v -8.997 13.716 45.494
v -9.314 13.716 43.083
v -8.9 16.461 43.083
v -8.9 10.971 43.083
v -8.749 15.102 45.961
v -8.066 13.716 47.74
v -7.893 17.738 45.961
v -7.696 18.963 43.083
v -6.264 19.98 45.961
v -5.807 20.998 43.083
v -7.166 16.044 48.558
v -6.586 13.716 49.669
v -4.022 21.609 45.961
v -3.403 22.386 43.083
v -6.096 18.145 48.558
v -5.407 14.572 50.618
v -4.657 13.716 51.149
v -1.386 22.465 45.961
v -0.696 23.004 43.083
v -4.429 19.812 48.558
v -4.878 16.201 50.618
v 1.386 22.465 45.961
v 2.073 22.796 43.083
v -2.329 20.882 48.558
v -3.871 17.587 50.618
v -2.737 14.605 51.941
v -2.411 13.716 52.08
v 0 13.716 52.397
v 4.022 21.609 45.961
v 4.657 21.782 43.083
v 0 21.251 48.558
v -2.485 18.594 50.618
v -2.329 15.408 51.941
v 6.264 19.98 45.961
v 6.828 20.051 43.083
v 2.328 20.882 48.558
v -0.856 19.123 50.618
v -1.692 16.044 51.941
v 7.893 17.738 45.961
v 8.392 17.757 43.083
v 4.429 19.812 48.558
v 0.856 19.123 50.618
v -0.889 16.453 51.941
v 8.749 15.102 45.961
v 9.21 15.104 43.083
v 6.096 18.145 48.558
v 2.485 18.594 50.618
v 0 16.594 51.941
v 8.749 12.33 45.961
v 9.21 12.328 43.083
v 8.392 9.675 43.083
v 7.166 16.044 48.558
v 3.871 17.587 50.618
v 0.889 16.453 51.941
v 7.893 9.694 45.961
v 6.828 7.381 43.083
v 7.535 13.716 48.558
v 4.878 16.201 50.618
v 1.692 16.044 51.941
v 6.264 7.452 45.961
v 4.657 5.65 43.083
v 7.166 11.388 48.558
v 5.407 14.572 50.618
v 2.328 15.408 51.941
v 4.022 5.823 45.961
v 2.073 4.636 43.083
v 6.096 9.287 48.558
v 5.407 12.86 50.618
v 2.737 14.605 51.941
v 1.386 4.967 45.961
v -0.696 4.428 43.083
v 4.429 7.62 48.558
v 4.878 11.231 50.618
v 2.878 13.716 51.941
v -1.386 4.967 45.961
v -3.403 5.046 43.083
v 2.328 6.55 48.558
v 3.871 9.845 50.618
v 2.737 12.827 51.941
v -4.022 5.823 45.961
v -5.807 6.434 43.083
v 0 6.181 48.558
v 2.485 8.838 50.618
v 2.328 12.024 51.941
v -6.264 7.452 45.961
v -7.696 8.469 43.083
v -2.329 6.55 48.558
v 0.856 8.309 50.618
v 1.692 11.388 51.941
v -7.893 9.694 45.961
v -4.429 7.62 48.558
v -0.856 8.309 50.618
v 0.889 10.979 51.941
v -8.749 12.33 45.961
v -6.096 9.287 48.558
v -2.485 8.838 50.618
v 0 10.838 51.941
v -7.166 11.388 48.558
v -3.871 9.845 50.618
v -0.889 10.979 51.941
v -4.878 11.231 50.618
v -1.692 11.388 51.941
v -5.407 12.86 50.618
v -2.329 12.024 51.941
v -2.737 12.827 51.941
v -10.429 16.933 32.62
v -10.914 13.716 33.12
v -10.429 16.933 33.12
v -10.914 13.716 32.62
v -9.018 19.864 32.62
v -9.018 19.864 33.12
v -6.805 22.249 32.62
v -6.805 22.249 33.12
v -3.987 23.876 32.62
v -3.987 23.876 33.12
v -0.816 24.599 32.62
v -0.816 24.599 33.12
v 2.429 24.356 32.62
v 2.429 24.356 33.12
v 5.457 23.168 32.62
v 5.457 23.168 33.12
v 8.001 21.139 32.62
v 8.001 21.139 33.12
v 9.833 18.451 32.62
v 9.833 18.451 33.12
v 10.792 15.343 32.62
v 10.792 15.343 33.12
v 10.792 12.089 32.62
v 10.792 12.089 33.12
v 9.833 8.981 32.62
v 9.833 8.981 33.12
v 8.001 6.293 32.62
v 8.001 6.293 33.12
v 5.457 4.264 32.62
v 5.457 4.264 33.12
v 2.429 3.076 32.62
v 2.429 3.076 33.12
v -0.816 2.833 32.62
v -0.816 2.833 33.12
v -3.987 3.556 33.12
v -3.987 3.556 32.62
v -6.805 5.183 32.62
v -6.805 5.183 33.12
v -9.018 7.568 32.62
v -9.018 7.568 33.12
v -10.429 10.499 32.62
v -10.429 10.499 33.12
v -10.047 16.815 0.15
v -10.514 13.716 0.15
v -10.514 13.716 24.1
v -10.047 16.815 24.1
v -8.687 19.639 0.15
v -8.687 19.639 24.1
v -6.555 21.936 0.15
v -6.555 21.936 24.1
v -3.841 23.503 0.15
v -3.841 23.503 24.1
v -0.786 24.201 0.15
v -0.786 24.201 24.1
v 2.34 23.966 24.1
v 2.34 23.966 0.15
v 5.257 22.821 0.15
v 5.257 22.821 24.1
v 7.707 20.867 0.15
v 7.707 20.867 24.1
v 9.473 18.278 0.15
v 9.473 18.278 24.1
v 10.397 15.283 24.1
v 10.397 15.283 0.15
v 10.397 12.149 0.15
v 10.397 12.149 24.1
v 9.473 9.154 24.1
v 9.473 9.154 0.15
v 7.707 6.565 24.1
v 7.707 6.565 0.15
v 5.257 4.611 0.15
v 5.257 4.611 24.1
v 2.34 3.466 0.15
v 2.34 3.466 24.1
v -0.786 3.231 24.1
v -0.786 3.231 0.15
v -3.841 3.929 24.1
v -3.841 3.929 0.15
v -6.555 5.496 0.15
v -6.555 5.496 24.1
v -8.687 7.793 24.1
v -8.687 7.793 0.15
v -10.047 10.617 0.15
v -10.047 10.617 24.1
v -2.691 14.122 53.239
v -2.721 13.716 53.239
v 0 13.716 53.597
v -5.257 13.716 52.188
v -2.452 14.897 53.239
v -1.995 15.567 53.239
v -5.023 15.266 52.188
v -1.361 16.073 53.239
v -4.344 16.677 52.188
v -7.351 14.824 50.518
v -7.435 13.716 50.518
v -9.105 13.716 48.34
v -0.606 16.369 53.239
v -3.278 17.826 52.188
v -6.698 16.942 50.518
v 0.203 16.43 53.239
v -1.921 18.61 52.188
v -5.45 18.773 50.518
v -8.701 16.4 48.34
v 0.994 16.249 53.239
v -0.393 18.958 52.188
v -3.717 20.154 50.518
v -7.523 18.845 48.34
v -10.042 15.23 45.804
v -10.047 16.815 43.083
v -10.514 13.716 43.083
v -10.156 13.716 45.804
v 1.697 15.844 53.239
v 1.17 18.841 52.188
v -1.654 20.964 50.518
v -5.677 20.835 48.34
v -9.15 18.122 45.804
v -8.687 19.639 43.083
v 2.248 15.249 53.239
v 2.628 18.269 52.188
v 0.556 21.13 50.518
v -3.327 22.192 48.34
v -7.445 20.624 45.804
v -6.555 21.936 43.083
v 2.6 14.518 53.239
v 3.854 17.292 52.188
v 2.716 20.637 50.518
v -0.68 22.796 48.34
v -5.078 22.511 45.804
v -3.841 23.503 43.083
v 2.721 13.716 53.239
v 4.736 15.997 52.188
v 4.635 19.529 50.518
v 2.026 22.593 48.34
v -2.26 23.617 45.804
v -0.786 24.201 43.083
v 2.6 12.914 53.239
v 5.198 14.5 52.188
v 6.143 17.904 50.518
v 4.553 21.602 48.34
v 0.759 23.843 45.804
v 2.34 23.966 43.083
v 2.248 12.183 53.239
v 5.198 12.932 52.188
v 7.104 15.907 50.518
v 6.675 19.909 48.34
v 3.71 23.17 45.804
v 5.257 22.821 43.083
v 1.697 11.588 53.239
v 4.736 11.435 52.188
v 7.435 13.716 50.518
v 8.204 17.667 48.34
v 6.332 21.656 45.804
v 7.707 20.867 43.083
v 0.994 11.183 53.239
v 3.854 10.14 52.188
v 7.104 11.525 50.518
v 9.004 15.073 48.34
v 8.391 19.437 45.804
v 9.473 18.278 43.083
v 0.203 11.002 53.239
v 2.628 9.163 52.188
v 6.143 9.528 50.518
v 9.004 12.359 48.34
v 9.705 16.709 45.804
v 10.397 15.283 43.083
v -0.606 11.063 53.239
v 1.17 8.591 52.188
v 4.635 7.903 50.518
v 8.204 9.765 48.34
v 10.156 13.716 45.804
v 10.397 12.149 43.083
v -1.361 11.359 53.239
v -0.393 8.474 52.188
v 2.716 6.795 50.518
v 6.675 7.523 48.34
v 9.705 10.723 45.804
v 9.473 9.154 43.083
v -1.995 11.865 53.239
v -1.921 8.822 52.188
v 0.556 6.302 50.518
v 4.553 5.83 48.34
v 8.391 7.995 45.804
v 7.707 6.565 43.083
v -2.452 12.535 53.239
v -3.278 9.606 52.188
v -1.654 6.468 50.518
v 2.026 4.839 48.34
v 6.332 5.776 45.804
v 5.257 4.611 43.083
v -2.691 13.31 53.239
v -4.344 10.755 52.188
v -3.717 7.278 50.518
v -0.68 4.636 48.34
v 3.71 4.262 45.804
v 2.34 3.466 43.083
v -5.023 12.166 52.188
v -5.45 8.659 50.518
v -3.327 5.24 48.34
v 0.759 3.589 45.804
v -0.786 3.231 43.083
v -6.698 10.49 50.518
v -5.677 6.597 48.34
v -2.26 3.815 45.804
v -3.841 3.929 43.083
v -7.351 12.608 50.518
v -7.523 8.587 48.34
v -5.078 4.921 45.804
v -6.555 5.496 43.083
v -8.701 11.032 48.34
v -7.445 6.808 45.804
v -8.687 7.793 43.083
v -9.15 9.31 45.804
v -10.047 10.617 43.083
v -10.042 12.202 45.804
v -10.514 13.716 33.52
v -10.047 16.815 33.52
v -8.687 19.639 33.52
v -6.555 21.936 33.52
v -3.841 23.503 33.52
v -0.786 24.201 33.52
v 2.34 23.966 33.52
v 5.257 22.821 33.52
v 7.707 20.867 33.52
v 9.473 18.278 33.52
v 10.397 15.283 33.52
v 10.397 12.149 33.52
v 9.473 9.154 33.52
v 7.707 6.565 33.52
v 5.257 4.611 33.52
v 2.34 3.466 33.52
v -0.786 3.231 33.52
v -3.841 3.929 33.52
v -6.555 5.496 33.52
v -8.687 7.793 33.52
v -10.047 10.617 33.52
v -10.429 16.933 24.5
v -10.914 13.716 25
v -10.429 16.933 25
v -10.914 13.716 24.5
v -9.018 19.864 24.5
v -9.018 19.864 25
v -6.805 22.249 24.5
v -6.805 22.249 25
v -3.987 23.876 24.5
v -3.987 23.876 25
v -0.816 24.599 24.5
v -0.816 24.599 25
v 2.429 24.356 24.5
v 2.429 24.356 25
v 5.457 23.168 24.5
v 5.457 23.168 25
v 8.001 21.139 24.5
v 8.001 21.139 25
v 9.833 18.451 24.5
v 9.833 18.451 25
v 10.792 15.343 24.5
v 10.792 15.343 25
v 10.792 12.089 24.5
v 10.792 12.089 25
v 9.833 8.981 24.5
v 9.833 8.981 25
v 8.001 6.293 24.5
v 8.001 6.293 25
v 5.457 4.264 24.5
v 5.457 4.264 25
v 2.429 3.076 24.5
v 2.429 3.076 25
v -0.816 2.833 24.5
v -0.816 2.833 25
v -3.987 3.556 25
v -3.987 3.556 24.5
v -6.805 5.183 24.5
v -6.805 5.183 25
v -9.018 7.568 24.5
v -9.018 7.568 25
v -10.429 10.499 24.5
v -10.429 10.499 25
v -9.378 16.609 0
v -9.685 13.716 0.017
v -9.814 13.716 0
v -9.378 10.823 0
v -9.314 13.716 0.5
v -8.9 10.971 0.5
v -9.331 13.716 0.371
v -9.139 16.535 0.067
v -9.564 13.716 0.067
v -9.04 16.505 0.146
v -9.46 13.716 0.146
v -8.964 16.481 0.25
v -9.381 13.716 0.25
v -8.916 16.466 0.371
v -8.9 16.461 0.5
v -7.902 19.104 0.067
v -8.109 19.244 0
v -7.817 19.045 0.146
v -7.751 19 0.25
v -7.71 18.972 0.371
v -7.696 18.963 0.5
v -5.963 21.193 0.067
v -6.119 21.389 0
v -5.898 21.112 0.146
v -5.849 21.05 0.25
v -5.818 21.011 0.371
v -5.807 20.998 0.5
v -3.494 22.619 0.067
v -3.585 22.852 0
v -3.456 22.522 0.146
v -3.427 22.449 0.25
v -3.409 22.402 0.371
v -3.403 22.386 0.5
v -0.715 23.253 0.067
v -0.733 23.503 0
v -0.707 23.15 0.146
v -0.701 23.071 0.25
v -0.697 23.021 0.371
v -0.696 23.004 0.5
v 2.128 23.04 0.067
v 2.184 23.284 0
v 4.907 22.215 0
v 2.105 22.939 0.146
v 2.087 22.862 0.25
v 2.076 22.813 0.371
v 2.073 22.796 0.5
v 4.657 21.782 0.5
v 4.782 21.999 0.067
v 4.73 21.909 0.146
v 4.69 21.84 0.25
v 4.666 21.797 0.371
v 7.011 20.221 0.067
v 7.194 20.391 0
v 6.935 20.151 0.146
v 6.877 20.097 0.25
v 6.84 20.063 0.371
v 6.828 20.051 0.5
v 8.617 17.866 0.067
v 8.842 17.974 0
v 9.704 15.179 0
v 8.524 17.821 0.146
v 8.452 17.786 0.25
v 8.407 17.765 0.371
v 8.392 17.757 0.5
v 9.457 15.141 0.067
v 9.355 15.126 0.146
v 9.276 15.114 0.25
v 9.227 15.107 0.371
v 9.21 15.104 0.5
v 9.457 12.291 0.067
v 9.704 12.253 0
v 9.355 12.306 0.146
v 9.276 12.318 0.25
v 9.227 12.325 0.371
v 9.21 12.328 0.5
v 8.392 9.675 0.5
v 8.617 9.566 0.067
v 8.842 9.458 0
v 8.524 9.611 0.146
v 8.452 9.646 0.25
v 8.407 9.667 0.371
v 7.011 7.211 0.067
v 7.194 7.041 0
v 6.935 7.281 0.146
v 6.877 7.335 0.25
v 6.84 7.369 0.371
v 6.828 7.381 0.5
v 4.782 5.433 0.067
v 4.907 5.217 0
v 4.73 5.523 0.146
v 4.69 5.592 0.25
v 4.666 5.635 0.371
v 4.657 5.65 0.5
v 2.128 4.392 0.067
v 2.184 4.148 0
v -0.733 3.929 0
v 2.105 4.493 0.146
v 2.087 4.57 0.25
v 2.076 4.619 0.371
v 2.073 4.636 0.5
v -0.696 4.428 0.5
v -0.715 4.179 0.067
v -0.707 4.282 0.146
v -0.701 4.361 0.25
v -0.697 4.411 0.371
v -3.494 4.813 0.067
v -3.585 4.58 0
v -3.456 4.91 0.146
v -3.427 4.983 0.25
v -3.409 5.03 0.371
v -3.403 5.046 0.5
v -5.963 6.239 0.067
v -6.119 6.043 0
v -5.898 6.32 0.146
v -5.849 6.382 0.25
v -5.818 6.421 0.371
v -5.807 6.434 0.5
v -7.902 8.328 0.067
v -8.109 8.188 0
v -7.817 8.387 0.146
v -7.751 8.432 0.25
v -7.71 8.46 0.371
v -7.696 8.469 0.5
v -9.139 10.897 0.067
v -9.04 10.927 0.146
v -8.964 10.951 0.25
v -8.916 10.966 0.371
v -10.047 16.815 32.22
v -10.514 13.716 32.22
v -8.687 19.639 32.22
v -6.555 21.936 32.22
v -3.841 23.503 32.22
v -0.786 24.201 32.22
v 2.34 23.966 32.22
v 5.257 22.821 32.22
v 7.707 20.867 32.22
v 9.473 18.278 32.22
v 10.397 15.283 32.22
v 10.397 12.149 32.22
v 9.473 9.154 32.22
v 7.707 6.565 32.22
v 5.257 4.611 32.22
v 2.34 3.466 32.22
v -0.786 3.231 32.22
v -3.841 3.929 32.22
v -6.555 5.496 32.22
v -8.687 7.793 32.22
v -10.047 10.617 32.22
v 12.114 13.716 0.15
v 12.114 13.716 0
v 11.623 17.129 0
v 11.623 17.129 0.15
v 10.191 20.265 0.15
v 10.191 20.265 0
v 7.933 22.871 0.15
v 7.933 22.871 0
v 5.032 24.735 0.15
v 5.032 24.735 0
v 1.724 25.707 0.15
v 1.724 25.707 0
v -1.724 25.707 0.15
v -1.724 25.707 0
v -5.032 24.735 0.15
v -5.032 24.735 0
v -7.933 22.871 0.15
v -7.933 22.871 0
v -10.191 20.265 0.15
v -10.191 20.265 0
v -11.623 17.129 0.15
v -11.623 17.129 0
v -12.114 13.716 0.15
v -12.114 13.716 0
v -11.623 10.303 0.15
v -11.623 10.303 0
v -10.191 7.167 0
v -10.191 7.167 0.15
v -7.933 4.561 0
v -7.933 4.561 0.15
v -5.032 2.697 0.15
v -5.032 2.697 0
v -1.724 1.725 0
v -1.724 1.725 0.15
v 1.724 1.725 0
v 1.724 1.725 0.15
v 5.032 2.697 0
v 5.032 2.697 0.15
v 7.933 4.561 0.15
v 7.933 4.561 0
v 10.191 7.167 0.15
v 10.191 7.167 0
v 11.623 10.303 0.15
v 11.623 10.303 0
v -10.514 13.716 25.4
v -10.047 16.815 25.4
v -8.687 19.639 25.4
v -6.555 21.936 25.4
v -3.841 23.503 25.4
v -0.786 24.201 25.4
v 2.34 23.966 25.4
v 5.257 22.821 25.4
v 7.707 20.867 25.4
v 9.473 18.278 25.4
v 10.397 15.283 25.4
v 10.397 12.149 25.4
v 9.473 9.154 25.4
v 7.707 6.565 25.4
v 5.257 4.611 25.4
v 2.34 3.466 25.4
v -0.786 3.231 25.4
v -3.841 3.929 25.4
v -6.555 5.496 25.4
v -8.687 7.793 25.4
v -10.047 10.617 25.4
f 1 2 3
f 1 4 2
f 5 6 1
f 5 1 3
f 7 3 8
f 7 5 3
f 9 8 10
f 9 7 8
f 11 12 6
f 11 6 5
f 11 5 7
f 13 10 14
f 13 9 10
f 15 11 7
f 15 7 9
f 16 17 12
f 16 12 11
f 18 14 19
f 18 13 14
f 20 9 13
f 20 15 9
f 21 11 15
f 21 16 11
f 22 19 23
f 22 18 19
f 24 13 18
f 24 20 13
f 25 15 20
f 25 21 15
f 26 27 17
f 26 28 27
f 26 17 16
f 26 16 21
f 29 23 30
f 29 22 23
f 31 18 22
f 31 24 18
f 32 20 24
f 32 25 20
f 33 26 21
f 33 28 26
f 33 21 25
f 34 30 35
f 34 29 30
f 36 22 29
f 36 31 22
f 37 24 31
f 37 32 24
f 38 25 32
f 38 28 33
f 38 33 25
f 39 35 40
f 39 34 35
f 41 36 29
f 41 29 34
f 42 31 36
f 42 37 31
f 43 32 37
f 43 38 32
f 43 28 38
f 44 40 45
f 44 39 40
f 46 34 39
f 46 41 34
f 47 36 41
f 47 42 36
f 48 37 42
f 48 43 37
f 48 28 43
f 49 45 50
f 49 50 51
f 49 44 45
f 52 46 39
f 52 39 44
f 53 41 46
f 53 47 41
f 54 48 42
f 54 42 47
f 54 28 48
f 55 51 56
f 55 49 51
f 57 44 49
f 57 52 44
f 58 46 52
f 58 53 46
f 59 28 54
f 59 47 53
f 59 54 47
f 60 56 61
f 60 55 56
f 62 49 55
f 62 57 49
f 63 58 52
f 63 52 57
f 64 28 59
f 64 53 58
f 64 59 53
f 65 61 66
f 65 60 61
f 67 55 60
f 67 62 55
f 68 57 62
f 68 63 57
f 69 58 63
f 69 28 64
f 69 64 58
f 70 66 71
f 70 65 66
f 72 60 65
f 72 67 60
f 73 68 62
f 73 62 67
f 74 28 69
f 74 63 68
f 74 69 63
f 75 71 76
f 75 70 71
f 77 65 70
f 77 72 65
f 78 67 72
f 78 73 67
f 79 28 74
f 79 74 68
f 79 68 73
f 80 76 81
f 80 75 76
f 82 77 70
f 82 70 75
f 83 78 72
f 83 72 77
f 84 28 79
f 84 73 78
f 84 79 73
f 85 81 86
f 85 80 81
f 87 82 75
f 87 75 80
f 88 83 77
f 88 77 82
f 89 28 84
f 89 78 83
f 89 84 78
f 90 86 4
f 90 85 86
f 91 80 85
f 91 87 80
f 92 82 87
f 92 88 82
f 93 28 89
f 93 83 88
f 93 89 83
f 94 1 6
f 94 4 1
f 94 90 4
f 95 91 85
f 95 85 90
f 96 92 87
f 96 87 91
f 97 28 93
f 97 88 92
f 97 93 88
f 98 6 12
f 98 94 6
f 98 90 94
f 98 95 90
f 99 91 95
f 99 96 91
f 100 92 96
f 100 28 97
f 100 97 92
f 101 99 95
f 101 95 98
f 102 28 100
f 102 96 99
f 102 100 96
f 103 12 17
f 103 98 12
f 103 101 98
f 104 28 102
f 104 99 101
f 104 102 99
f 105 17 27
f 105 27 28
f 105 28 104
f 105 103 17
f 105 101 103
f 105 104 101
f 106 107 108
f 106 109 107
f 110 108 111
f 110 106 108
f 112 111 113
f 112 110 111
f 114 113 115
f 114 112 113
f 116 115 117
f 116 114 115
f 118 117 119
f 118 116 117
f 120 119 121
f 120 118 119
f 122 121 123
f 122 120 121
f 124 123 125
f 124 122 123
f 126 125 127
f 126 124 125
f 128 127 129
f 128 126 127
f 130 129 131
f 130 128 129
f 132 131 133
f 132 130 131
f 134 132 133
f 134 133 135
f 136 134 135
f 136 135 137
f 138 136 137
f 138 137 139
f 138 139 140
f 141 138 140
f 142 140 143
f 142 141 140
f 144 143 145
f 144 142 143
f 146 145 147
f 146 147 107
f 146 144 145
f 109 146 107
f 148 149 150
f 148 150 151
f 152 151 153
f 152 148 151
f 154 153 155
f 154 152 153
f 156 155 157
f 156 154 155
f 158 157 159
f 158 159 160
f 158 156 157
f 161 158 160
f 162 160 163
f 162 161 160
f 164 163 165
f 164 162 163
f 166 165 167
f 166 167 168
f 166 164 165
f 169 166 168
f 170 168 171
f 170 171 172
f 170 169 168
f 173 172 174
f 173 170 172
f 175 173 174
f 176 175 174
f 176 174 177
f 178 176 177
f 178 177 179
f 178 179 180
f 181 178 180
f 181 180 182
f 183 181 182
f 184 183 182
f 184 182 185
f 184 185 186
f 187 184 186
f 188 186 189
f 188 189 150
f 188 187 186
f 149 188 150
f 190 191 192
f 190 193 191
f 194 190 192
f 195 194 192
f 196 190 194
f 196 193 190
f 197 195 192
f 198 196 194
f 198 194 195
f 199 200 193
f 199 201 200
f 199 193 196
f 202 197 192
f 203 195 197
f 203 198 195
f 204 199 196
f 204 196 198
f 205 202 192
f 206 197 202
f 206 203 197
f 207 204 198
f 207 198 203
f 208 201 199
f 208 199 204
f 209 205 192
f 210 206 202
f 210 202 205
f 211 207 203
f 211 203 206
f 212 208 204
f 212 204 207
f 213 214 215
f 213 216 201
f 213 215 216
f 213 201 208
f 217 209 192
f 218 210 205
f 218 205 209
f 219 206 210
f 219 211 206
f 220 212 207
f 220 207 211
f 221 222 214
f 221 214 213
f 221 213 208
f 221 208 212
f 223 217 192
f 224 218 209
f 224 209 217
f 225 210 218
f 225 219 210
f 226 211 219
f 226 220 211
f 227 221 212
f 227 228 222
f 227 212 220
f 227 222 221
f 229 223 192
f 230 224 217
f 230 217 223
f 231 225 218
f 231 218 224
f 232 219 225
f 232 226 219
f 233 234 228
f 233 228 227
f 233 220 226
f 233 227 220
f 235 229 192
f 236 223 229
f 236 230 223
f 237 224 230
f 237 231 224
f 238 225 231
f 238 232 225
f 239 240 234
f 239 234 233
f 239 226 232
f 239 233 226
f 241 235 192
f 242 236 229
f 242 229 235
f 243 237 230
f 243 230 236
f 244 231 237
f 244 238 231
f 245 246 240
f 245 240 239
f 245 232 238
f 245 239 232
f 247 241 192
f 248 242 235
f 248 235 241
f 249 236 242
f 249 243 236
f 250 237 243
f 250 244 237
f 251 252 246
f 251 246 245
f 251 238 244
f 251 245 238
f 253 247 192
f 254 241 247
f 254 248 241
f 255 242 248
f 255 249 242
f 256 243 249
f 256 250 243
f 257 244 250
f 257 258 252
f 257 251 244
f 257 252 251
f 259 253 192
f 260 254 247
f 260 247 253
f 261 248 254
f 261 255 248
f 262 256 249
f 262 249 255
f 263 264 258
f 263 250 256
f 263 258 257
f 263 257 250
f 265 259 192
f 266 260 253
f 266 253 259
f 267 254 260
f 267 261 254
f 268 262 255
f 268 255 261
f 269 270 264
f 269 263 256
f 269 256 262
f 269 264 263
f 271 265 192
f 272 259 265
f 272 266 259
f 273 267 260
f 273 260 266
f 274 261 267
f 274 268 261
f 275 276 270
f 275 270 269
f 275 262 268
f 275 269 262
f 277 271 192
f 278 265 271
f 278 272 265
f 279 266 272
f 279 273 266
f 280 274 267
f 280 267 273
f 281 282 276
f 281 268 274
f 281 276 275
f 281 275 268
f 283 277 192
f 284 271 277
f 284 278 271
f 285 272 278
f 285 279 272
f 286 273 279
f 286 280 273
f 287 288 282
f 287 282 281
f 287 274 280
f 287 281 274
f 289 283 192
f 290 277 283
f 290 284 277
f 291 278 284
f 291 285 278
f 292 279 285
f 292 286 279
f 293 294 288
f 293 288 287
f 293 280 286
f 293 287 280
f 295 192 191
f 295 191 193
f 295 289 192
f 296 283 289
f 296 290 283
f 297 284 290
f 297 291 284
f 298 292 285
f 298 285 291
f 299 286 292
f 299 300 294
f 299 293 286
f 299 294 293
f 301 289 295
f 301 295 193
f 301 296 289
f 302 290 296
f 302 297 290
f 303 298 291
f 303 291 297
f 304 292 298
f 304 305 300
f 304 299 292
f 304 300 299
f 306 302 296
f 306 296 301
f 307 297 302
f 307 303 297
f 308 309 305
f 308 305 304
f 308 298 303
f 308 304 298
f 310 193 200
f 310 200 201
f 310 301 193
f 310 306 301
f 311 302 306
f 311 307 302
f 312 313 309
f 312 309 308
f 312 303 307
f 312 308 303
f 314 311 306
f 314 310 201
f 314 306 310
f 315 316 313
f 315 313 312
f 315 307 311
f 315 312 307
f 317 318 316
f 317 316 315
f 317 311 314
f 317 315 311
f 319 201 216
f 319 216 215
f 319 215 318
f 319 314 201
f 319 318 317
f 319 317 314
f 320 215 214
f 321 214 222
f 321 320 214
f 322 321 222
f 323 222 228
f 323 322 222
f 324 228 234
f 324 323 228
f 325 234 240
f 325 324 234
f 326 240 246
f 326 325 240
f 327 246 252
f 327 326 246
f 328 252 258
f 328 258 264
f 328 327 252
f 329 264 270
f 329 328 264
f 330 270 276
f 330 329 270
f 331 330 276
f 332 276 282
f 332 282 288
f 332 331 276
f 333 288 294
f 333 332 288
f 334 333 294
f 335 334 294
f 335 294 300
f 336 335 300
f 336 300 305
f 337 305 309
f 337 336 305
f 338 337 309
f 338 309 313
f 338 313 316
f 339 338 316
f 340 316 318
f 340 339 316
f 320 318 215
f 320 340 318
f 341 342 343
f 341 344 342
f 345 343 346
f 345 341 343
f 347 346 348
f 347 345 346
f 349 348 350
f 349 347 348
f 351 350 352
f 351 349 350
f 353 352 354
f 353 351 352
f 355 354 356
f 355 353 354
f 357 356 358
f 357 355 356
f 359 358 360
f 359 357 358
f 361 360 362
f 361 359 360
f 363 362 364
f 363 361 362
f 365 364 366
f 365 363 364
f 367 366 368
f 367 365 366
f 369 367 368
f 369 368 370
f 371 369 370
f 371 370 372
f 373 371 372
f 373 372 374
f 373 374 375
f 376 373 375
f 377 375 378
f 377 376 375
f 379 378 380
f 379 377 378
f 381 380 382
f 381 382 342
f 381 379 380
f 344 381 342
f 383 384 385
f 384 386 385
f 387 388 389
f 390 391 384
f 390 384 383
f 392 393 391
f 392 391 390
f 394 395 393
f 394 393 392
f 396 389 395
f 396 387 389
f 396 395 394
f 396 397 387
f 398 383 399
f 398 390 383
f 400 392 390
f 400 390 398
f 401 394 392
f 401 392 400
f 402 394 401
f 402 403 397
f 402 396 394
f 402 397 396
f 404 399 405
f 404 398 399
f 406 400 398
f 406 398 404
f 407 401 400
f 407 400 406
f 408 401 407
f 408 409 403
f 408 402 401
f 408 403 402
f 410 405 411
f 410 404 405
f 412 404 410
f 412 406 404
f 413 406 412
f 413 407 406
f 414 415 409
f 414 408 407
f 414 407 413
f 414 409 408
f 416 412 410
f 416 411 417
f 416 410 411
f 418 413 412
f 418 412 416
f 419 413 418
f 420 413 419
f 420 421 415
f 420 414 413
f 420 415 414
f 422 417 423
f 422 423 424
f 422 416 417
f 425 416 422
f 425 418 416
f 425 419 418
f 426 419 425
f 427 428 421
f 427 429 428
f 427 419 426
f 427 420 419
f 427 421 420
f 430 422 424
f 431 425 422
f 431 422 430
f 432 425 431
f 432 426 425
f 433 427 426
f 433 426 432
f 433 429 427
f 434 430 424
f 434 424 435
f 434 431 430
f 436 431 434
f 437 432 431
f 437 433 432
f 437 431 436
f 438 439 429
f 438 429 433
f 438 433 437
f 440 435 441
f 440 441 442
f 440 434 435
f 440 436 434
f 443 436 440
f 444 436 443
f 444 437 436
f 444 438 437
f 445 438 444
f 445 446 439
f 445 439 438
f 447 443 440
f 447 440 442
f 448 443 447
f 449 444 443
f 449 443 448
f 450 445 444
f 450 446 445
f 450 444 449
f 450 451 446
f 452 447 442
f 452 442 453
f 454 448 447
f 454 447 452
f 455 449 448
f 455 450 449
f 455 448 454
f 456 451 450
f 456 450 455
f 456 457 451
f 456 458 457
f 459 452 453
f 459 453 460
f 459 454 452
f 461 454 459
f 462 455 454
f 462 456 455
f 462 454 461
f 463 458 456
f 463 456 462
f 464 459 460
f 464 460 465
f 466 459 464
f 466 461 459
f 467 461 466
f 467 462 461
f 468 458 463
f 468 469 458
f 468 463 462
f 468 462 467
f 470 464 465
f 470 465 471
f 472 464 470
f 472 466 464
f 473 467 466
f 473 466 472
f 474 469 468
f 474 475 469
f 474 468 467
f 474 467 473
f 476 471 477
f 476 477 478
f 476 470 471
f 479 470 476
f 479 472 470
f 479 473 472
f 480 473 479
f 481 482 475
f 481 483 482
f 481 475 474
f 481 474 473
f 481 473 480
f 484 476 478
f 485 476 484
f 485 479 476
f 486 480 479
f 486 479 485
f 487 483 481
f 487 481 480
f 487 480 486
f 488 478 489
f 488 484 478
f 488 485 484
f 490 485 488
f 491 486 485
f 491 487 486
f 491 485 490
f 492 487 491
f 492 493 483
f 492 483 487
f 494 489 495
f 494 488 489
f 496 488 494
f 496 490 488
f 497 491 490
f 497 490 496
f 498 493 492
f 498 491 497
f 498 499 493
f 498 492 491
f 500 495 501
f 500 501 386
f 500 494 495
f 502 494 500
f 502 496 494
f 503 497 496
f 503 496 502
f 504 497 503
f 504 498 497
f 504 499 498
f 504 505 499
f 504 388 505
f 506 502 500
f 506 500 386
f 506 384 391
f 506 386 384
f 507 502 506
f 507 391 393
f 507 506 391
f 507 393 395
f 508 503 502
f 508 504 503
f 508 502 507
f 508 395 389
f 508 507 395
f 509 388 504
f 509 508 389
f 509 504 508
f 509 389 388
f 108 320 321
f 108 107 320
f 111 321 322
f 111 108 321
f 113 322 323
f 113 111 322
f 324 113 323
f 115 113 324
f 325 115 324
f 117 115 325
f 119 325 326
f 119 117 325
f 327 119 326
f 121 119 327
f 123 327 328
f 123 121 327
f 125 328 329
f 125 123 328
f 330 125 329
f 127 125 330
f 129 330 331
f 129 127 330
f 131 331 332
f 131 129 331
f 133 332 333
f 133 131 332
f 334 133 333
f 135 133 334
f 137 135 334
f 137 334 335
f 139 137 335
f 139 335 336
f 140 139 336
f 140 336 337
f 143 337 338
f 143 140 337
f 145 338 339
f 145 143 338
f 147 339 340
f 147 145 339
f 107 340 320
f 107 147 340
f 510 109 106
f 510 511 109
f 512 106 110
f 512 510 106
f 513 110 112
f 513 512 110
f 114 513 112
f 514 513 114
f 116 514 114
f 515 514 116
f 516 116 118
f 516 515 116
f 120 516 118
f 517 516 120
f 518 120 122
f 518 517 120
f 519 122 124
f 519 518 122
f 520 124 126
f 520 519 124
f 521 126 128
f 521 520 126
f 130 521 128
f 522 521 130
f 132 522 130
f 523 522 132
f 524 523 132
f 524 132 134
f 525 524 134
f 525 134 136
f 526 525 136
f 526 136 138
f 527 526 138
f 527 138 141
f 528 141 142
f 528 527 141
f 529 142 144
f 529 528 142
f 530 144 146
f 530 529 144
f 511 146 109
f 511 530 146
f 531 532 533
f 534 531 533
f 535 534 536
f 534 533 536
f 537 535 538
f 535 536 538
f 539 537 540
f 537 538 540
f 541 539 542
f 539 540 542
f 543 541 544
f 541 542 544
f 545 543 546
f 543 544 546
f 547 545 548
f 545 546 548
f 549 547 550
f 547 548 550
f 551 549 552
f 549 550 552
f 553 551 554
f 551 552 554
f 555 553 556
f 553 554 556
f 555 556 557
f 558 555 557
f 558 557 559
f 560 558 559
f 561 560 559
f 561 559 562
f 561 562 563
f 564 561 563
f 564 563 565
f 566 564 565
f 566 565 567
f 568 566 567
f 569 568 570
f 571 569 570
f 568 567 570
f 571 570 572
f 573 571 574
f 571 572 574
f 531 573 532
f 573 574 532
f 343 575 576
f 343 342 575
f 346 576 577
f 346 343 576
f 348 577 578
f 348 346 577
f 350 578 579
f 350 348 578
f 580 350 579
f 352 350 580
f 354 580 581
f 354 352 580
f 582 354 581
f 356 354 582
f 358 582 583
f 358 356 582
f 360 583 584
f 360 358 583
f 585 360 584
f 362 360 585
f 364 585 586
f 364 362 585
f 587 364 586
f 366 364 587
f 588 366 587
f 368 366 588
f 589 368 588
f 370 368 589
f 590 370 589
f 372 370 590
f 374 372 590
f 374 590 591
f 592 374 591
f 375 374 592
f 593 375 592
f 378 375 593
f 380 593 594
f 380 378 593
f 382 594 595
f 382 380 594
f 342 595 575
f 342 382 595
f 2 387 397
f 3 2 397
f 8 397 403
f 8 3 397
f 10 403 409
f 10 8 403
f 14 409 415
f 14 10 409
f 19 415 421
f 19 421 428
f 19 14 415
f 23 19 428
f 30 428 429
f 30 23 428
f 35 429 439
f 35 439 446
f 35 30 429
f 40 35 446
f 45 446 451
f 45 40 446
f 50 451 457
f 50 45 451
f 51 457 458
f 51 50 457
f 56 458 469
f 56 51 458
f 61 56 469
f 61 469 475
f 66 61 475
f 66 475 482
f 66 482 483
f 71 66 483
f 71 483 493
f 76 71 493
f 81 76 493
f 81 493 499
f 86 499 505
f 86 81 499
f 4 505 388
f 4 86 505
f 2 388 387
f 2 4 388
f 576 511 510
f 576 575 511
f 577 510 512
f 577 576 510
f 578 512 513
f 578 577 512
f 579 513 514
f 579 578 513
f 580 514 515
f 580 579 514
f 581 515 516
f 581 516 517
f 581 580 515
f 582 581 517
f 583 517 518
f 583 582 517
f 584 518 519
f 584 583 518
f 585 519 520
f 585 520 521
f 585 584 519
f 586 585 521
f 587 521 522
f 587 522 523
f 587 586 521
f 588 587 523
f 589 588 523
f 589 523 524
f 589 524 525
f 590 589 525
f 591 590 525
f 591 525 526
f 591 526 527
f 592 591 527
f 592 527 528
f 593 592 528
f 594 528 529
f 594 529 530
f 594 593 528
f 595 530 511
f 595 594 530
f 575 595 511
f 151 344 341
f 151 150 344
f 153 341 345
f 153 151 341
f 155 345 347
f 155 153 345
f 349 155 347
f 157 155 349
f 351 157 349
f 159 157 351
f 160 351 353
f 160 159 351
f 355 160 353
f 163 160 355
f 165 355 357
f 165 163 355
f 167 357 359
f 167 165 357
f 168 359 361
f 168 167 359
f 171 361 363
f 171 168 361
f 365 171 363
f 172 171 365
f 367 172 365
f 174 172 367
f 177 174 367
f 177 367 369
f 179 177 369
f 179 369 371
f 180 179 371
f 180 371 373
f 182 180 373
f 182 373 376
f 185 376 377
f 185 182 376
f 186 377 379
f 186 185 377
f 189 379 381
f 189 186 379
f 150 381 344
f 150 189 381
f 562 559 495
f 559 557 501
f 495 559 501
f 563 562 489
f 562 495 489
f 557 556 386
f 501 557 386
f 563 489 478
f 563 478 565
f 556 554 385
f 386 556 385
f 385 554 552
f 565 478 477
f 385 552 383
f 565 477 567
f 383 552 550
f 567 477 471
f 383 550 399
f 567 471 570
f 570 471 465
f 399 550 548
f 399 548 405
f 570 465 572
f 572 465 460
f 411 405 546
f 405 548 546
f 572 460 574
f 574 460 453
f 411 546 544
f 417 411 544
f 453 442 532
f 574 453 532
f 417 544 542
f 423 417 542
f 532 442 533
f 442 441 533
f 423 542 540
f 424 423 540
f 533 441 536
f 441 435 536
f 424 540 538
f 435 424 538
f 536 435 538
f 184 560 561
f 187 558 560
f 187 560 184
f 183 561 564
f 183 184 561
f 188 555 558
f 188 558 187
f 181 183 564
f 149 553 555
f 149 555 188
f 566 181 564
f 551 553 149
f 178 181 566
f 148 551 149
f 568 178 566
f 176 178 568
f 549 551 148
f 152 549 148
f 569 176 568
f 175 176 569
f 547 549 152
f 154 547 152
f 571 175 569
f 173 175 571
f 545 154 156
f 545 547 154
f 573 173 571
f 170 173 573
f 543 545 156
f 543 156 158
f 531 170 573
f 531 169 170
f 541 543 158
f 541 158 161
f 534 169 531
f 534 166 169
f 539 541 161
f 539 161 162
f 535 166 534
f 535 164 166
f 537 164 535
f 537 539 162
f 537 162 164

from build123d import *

# Parameters (mm, degrees)
F2_R     = 0.5
F3_R     = 12.114
F3_R_2   = 10.514
F4_DEPTH = 0.15


with BuildPart() as f1:
    # F0 (on Front) → F1 (revolve)
    with BuildSketch(Plane.XZ):
        Polygon((-10.514, 33.12), (-10.514, 33.52), (-10.914, 33.12), (-10.914, 32.62), (-10.514, 32.22), (-10.514, 32.62), align=None)
        Polygon((-10.914, 24.5), (-10.514, 24.1), (-10.514, 24.5), (-10.514, 25), (-10.514, 25.4), (-10.914, 25), align=None)
        with BuildLine():
            Line((-10.514, 0), (-9.314, 0))
            Line((-9.314, 0), (-9.314, 43.083))
            ThreePointArc((-9.314, 43.083), (-6.58599256, 49.66899256), (0, 52.397))
            Line((0, 52.397), (0, 53.597))
            ThreePointArc((0, 53.597), (-7.4345206974, 50.5175206974), (-10.514, 43.083))
            Line((-10.514, 43.083), (-10.514, 33.52))
            Line((-10.514, 33.52), (-10.514, 33.12))
            Line((-10.514, 33.12), (-10.514, 32.62))
            Line((-10.514, 32.62), (-10.514, 32.22))
            Line((-10.514, 32.22), (-10.514, 25.4))
            Line((-10.514, 25.4), (-10.514, 25))
            Line((-10.514, 25), (-10.514, 24.5))
            Line((-10.514, 24.5), (-10.514, 24.1))
            Line((-10.514, 24.1), (-10.514, 0))
        make_face()
    revolve(axis=Axis((0, 0, 26.1985), (0, 0, -1)))

    # F2
    f2_edges = [f1.edges().sort_by_distance(p)[0] for p in [
        (9.314, 0, 0),
    ]]
    fillet(f2_edges, radius=F2_R)

    # F3 (on Top) → F4 (join)
    with BuildSketch(Plane.XY):
        Circle(F3_R)
        Circle(F3_R_2, mode=Mode.SUBTRACT)
    extrude(amount=F4_DEPTH)


with BuildPart() as f1_1:
    # F5: moved
    add(f1.part.moved(Location((0, 13.716, 0))))


solid = f1_1.part
